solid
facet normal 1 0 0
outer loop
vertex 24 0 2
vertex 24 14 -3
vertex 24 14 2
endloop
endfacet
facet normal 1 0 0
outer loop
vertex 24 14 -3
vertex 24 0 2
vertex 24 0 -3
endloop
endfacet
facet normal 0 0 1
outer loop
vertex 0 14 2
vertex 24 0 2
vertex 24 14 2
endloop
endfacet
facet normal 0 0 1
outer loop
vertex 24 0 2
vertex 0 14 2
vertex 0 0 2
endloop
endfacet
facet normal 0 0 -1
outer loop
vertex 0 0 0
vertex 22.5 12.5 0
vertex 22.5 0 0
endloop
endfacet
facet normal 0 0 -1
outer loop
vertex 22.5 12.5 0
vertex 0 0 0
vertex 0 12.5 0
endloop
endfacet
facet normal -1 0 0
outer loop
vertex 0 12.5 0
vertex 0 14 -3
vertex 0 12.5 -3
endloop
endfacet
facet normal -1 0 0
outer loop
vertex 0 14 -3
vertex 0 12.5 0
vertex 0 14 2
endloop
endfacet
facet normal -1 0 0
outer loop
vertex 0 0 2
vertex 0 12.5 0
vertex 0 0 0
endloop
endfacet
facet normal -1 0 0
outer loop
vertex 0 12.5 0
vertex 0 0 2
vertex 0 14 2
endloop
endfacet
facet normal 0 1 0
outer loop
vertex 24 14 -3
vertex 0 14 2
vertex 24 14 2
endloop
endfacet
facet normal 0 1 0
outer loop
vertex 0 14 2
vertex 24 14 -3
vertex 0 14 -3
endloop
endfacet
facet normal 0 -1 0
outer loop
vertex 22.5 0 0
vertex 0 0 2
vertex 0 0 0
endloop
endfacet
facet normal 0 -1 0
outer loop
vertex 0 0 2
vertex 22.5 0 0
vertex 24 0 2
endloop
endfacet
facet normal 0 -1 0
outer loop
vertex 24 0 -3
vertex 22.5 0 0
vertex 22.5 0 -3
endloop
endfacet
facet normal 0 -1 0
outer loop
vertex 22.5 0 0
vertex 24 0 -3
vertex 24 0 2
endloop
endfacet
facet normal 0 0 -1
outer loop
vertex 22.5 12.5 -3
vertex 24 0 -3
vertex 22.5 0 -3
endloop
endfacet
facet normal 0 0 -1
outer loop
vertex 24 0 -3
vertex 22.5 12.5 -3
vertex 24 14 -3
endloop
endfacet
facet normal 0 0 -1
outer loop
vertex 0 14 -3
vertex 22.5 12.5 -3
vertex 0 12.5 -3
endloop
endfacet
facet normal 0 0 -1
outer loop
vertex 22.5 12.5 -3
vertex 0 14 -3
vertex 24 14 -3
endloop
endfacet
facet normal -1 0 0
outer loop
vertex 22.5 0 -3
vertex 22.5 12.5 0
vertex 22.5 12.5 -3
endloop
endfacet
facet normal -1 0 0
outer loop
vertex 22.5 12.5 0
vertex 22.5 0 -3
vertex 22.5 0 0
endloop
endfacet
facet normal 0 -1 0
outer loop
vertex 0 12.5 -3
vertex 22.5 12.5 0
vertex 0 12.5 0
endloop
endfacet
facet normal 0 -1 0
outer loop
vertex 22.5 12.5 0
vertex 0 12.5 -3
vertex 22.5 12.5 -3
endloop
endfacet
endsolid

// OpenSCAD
// WheresDat — Label tab for sortimo_box.scad, printed separately.
//
// The corner label platform from the original box design got cut from
// the box itself: floating above the rim, it was an overhang, forcing
// support material when the box prints on its side (see SPEC.md,
// "Label platform tried and removed"). Same idea, better execution:
// print this flat (trivial, no supports needed at all) and attach with
// a dab of superglue to the box's top corner after the fact.
//
// Not yet rendered/validated (no OpenSCAD CLI in this environment).

/* [Sized to match sortimo_box.scad's label tier] */
label_w      = 20;  // mm — must match the confirmed 20x10mm inner label tier
label_h      = 10;  // mm
label_margin = 2;   // mm, tab footprint = label size + margin on all sides
tab_thickness = 2;  // mm — flat plate, thin enough to be trivial to print, thick enough to handle/glue

/* [Registration rim — self-aligns the tab in the box's corner] */
// The tab sits in the same back-right corner the original built-in
// platform used (flush against both walls there). A rim on those same 2
// outer edges, dropping down alongside the box's own wall, means the tab
// physically locates itself when glued on instead of needing to be
// eyeballed into position.
rim_depth = 3;   // mm, how far the rim drops below the plate to engage the box's wall
rim_wall  = 1.5; // mm, rim thickness — still flat-printable, no overhang (drops straight down, prints fine on its back)

tab_x = label_w + 2 * label_margin;
tab_y = label_h + 2 * label_margin;

module label_tab() {
    union() {
        // Flat plate — the label-mounting surface
        cube([tab_x, tab_y, tab_thickness]);

        // Rim on the 2 outer edges (matching the box's back-right corner
        // placement), dropping down to hook alongside the box's wall.
        translate([tab_x - rim_wall, 0, -rim_depth])
            cube([rim_wall, tab_y, rim_depth]);
        translate([0, tab_y - rim_wall, -rim_depth])
            cube([tab_x, rim_wall, rim_depth]);
    }
}

label_tab();
